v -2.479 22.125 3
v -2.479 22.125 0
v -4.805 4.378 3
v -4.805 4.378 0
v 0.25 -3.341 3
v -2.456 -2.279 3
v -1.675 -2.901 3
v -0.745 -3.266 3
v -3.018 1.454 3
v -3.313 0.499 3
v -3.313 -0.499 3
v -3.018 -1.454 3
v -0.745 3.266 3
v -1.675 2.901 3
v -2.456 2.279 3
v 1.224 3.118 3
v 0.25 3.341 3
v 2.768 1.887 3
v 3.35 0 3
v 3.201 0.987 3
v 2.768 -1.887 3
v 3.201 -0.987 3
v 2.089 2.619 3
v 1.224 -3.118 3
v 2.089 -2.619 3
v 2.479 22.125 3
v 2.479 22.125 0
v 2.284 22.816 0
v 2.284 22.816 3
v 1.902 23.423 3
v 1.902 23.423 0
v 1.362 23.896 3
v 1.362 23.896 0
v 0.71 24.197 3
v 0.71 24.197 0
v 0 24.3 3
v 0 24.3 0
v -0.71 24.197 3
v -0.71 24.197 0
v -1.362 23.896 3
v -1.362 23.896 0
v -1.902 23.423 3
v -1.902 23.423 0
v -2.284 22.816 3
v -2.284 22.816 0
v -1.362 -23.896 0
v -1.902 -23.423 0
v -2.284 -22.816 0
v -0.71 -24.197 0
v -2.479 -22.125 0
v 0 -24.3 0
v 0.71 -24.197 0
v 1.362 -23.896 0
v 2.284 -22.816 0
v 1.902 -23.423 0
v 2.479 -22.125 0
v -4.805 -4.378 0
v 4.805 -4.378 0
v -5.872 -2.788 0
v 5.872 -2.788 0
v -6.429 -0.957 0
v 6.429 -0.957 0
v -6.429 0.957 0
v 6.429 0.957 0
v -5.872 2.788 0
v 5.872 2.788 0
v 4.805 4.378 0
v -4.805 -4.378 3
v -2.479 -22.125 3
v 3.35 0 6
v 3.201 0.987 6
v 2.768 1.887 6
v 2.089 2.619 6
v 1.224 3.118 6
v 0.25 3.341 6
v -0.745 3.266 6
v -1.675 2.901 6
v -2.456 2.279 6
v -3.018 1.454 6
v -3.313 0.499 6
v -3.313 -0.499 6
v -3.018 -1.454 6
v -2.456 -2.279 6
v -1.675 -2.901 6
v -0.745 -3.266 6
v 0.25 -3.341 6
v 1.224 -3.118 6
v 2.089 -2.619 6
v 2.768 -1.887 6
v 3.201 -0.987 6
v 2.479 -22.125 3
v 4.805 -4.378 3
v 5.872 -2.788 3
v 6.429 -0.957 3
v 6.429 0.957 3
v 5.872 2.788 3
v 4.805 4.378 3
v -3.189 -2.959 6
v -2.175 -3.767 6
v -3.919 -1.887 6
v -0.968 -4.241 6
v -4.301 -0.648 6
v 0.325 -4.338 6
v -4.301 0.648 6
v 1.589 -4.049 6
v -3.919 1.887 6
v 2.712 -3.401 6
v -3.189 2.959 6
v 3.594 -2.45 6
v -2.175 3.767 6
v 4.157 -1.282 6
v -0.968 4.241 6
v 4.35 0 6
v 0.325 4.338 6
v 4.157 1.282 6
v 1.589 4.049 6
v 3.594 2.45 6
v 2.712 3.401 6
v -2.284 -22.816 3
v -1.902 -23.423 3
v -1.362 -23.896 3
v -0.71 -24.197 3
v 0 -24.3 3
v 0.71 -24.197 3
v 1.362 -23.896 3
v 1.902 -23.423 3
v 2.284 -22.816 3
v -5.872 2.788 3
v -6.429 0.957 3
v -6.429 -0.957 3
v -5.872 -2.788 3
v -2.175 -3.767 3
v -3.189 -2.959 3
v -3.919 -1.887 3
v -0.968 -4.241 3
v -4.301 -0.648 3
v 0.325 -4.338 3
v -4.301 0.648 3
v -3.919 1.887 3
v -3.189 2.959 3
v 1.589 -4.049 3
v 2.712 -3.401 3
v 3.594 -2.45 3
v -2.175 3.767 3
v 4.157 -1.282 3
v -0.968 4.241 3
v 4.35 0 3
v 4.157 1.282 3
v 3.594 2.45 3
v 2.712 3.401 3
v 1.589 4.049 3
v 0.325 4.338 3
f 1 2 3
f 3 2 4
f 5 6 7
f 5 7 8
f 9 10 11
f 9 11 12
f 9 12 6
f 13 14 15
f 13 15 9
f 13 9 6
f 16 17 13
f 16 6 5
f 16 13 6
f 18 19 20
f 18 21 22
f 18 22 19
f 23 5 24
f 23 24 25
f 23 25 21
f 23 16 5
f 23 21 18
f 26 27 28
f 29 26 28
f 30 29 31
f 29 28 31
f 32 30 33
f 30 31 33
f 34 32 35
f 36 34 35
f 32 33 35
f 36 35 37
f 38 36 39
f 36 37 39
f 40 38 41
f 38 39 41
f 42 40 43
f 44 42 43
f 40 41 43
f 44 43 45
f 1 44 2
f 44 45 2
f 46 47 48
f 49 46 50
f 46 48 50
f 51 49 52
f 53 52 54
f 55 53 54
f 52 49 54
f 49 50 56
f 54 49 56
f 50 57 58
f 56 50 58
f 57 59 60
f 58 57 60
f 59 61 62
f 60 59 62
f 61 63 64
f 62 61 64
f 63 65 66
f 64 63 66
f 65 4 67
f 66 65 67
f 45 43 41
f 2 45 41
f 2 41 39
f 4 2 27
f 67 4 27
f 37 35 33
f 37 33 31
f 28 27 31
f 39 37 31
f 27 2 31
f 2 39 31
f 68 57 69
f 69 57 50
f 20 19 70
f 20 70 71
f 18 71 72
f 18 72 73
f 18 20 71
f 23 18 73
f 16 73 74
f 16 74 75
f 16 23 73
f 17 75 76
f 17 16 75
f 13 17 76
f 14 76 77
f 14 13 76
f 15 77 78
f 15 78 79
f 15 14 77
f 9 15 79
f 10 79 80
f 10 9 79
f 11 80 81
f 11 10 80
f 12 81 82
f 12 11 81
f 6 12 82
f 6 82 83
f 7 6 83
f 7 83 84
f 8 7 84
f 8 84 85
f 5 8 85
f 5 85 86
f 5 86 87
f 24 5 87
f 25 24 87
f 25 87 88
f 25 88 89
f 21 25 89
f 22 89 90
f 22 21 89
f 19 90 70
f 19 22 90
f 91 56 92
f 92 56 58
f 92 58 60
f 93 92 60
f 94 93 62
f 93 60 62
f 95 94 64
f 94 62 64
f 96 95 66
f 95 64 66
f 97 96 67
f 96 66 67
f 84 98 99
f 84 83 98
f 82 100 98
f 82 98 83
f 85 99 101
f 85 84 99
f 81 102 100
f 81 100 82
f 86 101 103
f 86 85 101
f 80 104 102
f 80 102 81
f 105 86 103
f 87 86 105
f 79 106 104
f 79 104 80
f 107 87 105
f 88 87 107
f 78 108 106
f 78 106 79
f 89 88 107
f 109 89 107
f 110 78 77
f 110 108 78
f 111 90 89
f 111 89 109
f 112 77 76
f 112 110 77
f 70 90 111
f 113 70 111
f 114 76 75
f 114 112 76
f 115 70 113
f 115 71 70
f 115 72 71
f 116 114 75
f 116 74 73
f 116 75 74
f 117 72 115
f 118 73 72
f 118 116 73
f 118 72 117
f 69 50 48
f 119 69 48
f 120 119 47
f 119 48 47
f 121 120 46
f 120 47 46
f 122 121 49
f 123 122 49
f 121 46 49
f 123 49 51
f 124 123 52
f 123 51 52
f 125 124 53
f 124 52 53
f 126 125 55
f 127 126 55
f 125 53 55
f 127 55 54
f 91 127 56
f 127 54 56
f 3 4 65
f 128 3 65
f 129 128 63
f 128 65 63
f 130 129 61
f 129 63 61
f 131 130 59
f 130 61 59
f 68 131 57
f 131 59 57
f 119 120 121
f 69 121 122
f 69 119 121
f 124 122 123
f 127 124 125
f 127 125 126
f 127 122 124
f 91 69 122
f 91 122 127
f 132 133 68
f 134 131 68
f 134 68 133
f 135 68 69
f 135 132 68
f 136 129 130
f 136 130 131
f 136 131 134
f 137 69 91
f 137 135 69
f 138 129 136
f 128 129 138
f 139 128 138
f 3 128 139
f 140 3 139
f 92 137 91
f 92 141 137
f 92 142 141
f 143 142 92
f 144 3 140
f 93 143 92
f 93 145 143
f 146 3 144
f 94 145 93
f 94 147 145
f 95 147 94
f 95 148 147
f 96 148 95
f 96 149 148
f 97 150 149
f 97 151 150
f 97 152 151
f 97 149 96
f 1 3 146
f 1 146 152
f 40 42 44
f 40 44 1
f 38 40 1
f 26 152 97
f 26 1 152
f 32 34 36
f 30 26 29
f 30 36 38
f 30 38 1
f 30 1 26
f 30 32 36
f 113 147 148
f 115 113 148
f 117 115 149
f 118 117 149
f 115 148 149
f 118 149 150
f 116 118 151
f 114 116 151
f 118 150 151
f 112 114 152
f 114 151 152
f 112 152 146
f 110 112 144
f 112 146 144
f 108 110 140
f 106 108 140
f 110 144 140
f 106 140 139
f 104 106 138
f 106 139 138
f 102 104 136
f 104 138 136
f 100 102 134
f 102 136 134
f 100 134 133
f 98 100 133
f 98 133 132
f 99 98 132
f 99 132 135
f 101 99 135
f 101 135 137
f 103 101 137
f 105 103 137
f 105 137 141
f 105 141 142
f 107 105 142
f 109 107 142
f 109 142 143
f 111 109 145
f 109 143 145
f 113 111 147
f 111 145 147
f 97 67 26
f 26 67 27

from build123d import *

# Parameters (mm, degrees)
EXTRUDE_1_DEPTH   = 3
SKETCH_2_R        = 4.35
SKETCH_2_R_2      = 3.35
EXTRUDE_1_2_DEPTH = 3


with BuildPart() as part:
    # 草图1 → Extrude 1 (new body)
    with BuildSketch(Plane.XY):
        with BuildLine():
            Line((-2.478800796, 22.124879382), (-4.804808177, 4.37764987))
            ThreePointArc((-4.804808177, 4.37764987), (-6.5, 0), (-4.804808177, -4.37764987))
            Line((-4.804808177, -4.37764987), (-2.478800796, -22.124879382))
            ThreePointArc((-2.478800796, -22.124879382), (0, -24.3), (2.478800796, -22.124879382))
            Line((2.478800796, -22.124879382), (4.804808177, -4.37764987))
            ThreePointArc((4.804808177, -4.37764987), (6.5, 0), (4.804808177, 4.37764987))
            Line((4.804808177, 4.37764987), (2.478800796, 22.124879382))
            ThreePointArc((2.478800796, 22.124879382), (0, 24.3), (-2.478800796, 22.124879382))
        make_face()
    extrude(amount=EXTRUDE_1_DEPTH)

    # 草图2 → Extrude 1 2 (add)
    with BuildSketch(Plane.XY.offset(3)):
        Circle(SKETCH_2_R)
        Circle(SKETCH_2_R_2, mode=Mode.SUBTRACT)
    extrude(amount=EXTRUDE_1_2_DEPTH)


solid = part.part
